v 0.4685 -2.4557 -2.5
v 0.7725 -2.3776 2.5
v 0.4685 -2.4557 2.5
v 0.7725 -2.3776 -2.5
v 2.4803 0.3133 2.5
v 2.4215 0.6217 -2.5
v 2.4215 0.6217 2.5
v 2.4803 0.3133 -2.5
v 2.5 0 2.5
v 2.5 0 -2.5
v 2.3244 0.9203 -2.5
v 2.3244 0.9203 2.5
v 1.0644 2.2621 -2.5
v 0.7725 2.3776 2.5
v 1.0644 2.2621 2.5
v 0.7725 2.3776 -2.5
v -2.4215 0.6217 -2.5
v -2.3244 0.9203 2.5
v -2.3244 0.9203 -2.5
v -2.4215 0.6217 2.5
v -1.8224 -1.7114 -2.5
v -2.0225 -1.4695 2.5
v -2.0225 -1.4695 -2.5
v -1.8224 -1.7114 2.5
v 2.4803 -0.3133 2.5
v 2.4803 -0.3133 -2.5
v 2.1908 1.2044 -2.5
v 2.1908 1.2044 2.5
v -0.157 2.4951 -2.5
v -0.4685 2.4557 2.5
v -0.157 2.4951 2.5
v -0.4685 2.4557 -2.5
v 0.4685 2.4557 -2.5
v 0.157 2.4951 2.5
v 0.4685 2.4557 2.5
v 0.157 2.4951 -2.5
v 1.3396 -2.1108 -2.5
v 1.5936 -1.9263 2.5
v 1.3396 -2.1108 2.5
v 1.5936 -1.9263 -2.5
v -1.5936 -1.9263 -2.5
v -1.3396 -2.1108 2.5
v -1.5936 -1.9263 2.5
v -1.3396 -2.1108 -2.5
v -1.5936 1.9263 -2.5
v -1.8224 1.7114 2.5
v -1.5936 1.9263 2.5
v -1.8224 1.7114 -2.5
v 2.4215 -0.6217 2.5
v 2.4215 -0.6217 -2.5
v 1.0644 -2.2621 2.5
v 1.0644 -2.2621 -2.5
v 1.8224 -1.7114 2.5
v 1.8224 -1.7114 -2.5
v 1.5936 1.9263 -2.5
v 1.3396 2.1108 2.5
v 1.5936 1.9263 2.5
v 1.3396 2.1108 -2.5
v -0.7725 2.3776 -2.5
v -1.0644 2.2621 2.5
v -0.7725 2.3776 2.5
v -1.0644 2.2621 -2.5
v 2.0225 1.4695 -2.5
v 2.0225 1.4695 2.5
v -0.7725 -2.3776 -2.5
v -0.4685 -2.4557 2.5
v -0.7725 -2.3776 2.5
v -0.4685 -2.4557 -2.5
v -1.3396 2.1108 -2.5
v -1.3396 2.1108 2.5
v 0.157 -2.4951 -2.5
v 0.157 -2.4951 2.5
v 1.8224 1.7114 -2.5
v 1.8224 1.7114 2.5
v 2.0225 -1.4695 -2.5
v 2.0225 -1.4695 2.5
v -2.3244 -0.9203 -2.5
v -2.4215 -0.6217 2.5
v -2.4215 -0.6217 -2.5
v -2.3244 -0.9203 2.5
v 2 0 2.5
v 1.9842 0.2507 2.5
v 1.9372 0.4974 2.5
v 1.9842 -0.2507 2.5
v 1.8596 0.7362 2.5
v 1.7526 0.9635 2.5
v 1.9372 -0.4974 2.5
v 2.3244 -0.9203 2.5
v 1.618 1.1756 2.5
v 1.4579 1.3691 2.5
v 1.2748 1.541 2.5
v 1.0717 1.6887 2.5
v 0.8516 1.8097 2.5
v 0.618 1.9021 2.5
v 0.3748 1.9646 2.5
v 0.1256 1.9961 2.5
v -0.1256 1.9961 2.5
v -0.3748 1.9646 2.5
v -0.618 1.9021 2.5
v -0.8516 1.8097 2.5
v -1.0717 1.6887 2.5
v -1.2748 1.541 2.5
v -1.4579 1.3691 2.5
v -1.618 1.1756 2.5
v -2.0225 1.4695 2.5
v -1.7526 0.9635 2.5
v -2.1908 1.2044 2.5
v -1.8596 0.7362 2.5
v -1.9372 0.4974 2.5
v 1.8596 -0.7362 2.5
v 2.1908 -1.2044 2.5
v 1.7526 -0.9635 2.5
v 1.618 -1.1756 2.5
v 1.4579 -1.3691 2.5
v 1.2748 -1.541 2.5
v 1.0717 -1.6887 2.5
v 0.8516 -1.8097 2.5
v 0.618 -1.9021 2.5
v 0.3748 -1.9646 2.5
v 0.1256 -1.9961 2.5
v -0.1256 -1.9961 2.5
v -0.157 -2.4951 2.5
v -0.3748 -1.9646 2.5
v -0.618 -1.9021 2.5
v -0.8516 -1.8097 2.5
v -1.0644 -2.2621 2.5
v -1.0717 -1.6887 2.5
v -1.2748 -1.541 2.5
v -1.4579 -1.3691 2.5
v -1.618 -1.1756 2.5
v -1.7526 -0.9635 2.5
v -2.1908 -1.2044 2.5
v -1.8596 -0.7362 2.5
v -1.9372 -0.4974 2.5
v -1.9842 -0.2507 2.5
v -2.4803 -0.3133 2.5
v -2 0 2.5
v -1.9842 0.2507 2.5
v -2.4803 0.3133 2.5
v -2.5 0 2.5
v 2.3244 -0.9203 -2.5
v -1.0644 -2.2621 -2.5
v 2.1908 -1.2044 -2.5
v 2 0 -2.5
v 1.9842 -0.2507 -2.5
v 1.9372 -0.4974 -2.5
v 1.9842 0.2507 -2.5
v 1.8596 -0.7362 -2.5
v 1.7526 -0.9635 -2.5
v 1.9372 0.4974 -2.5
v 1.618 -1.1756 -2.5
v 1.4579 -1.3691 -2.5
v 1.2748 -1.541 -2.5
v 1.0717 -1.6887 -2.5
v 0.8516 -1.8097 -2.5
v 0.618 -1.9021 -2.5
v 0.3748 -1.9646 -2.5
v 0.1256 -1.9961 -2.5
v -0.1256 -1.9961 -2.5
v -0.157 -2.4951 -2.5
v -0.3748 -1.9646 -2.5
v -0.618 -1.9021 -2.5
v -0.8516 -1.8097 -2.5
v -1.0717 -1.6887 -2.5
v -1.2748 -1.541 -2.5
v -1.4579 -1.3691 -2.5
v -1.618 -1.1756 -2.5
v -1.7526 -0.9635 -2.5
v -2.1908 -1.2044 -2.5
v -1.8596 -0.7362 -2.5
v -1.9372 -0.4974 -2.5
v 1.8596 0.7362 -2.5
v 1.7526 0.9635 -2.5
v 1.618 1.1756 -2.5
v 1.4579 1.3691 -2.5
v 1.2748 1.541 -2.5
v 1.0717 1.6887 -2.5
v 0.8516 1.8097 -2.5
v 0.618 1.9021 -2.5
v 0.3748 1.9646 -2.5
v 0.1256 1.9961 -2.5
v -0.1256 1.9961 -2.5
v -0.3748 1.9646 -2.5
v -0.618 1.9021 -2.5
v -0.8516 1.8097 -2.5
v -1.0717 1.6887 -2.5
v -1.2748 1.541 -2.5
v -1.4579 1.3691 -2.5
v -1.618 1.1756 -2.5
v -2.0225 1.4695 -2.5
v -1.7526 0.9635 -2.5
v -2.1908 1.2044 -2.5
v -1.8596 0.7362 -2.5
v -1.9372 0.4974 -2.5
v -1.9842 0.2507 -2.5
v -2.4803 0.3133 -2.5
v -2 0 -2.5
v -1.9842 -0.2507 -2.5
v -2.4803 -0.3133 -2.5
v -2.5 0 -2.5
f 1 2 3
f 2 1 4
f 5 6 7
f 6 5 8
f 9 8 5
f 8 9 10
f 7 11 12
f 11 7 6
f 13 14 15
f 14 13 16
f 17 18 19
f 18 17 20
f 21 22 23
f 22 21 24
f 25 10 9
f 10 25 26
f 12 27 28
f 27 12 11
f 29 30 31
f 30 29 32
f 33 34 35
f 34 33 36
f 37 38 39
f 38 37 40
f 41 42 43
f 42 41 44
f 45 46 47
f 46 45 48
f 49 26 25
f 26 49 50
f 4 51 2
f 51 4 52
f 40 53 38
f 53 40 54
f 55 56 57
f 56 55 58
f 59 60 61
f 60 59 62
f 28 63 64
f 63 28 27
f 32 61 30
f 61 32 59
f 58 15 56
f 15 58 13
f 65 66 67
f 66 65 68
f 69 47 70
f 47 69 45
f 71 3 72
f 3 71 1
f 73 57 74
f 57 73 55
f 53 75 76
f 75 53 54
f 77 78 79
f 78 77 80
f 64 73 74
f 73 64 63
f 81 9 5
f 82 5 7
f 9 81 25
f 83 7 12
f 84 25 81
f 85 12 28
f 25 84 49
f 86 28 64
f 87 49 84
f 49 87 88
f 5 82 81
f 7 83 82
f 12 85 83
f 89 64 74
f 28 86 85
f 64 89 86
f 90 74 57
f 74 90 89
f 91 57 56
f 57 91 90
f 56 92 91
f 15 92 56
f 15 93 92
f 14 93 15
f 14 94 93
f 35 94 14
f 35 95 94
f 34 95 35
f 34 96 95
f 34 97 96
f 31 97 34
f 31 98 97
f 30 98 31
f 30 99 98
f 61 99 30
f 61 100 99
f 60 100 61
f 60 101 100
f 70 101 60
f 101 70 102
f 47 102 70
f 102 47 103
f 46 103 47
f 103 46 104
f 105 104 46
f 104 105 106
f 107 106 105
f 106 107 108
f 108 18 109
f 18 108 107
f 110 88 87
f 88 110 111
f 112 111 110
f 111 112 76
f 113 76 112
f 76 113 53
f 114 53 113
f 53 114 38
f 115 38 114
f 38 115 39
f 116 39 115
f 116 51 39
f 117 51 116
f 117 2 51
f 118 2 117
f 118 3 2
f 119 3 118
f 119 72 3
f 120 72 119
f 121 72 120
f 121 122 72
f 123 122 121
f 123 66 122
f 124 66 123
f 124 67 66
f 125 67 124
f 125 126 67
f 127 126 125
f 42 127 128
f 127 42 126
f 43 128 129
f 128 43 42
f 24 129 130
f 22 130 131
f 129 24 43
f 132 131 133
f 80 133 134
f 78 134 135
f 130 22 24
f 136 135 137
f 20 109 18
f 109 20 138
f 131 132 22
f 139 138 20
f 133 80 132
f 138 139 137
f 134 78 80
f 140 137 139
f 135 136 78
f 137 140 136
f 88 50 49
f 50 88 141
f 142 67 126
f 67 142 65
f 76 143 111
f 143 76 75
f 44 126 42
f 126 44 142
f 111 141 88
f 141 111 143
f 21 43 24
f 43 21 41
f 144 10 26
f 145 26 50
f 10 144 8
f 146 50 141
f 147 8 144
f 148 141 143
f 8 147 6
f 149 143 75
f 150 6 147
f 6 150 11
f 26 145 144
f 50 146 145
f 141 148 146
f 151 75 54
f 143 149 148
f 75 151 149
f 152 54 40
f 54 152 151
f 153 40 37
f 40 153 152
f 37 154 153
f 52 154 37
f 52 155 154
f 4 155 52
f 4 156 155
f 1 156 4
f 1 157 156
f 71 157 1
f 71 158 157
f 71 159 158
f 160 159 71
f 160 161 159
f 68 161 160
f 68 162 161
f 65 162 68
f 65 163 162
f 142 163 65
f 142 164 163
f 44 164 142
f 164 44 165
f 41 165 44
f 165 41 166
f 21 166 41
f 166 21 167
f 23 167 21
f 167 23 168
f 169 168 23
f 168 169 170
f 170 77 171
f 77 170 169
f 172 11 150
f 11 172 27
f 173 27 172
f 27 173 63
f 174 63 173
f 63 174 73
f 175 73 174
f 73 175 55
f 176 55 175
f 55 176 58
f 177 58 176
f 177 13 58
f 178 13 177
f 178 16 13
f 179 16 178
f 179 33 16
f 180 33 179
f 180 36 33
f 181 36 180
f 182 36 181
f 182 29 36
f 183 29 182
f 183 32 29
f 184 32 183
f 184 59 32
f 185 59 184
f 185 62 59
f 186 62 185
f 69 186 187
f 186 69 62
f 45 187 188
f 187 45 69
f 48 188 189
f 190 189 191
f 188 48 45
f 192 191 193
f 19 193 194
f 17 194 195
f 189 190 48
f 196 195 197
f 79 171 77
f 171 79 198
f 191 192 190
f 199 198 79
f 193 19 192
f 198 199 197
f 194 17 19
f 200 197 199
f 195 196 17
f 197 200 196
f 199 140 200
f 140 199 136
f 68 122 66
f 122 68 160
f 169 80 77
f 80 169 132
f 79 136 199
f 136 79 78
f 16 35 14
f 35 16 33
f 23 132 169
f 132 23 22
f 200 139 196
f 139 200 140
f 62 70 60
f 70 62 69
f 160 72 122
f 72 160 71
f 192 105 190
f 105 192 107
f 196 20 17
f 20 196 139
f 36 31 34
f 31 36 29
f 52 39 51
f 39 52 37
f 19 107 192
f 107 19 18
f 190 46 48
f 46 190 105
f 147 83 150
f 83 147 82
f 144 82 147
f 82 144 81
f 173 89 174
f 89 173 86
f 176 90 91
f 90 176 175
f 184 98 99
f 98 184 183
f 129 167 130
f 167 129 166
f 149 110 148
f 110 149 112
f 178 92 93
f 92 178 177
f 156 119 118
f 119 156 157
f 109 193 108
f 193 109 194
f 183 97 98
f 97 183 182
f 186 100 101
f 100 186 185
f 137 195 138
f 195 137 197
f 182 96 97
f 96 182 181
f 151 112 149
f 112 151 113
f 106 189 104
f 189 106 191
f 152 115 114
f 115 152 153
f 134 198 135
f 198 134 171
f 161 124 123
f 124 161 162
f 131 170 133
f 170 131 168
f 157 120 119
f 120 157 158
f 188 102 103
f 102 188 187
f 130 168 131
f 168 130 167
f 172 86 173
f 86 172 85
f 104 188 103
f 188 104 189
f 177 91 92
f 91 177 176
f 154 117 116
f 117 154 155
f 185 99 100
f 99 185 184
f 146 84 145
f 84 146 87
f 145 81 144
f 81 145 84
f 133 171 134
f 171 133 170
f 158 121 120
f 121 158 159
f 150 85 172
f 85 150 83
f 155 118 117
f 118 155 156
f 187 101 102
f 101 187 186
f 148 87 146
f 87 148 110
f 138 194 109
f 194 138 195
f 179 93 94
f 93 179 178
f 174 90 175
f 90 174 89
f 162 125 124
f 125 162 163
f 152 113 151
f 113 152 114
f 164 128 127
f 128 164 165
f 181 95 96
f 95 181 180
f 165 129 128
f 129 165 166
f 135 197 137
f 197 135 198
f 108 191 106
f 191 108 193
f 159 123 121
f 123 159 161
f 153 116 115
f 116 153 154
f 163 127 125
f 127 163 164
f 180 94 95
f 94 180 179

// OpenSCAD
$fn = 50;


difference() {
	union() {
		translate(v = [0, 0, -2.5000000000]) {
			cylinder(h = 5, r = 2.5000000000);
		}
	}
	union() {
		translate(v = [0, 0, -100.0000000000]) {
			cylinder(h = 200, r = 2.0000000000);
		}
	}
}
